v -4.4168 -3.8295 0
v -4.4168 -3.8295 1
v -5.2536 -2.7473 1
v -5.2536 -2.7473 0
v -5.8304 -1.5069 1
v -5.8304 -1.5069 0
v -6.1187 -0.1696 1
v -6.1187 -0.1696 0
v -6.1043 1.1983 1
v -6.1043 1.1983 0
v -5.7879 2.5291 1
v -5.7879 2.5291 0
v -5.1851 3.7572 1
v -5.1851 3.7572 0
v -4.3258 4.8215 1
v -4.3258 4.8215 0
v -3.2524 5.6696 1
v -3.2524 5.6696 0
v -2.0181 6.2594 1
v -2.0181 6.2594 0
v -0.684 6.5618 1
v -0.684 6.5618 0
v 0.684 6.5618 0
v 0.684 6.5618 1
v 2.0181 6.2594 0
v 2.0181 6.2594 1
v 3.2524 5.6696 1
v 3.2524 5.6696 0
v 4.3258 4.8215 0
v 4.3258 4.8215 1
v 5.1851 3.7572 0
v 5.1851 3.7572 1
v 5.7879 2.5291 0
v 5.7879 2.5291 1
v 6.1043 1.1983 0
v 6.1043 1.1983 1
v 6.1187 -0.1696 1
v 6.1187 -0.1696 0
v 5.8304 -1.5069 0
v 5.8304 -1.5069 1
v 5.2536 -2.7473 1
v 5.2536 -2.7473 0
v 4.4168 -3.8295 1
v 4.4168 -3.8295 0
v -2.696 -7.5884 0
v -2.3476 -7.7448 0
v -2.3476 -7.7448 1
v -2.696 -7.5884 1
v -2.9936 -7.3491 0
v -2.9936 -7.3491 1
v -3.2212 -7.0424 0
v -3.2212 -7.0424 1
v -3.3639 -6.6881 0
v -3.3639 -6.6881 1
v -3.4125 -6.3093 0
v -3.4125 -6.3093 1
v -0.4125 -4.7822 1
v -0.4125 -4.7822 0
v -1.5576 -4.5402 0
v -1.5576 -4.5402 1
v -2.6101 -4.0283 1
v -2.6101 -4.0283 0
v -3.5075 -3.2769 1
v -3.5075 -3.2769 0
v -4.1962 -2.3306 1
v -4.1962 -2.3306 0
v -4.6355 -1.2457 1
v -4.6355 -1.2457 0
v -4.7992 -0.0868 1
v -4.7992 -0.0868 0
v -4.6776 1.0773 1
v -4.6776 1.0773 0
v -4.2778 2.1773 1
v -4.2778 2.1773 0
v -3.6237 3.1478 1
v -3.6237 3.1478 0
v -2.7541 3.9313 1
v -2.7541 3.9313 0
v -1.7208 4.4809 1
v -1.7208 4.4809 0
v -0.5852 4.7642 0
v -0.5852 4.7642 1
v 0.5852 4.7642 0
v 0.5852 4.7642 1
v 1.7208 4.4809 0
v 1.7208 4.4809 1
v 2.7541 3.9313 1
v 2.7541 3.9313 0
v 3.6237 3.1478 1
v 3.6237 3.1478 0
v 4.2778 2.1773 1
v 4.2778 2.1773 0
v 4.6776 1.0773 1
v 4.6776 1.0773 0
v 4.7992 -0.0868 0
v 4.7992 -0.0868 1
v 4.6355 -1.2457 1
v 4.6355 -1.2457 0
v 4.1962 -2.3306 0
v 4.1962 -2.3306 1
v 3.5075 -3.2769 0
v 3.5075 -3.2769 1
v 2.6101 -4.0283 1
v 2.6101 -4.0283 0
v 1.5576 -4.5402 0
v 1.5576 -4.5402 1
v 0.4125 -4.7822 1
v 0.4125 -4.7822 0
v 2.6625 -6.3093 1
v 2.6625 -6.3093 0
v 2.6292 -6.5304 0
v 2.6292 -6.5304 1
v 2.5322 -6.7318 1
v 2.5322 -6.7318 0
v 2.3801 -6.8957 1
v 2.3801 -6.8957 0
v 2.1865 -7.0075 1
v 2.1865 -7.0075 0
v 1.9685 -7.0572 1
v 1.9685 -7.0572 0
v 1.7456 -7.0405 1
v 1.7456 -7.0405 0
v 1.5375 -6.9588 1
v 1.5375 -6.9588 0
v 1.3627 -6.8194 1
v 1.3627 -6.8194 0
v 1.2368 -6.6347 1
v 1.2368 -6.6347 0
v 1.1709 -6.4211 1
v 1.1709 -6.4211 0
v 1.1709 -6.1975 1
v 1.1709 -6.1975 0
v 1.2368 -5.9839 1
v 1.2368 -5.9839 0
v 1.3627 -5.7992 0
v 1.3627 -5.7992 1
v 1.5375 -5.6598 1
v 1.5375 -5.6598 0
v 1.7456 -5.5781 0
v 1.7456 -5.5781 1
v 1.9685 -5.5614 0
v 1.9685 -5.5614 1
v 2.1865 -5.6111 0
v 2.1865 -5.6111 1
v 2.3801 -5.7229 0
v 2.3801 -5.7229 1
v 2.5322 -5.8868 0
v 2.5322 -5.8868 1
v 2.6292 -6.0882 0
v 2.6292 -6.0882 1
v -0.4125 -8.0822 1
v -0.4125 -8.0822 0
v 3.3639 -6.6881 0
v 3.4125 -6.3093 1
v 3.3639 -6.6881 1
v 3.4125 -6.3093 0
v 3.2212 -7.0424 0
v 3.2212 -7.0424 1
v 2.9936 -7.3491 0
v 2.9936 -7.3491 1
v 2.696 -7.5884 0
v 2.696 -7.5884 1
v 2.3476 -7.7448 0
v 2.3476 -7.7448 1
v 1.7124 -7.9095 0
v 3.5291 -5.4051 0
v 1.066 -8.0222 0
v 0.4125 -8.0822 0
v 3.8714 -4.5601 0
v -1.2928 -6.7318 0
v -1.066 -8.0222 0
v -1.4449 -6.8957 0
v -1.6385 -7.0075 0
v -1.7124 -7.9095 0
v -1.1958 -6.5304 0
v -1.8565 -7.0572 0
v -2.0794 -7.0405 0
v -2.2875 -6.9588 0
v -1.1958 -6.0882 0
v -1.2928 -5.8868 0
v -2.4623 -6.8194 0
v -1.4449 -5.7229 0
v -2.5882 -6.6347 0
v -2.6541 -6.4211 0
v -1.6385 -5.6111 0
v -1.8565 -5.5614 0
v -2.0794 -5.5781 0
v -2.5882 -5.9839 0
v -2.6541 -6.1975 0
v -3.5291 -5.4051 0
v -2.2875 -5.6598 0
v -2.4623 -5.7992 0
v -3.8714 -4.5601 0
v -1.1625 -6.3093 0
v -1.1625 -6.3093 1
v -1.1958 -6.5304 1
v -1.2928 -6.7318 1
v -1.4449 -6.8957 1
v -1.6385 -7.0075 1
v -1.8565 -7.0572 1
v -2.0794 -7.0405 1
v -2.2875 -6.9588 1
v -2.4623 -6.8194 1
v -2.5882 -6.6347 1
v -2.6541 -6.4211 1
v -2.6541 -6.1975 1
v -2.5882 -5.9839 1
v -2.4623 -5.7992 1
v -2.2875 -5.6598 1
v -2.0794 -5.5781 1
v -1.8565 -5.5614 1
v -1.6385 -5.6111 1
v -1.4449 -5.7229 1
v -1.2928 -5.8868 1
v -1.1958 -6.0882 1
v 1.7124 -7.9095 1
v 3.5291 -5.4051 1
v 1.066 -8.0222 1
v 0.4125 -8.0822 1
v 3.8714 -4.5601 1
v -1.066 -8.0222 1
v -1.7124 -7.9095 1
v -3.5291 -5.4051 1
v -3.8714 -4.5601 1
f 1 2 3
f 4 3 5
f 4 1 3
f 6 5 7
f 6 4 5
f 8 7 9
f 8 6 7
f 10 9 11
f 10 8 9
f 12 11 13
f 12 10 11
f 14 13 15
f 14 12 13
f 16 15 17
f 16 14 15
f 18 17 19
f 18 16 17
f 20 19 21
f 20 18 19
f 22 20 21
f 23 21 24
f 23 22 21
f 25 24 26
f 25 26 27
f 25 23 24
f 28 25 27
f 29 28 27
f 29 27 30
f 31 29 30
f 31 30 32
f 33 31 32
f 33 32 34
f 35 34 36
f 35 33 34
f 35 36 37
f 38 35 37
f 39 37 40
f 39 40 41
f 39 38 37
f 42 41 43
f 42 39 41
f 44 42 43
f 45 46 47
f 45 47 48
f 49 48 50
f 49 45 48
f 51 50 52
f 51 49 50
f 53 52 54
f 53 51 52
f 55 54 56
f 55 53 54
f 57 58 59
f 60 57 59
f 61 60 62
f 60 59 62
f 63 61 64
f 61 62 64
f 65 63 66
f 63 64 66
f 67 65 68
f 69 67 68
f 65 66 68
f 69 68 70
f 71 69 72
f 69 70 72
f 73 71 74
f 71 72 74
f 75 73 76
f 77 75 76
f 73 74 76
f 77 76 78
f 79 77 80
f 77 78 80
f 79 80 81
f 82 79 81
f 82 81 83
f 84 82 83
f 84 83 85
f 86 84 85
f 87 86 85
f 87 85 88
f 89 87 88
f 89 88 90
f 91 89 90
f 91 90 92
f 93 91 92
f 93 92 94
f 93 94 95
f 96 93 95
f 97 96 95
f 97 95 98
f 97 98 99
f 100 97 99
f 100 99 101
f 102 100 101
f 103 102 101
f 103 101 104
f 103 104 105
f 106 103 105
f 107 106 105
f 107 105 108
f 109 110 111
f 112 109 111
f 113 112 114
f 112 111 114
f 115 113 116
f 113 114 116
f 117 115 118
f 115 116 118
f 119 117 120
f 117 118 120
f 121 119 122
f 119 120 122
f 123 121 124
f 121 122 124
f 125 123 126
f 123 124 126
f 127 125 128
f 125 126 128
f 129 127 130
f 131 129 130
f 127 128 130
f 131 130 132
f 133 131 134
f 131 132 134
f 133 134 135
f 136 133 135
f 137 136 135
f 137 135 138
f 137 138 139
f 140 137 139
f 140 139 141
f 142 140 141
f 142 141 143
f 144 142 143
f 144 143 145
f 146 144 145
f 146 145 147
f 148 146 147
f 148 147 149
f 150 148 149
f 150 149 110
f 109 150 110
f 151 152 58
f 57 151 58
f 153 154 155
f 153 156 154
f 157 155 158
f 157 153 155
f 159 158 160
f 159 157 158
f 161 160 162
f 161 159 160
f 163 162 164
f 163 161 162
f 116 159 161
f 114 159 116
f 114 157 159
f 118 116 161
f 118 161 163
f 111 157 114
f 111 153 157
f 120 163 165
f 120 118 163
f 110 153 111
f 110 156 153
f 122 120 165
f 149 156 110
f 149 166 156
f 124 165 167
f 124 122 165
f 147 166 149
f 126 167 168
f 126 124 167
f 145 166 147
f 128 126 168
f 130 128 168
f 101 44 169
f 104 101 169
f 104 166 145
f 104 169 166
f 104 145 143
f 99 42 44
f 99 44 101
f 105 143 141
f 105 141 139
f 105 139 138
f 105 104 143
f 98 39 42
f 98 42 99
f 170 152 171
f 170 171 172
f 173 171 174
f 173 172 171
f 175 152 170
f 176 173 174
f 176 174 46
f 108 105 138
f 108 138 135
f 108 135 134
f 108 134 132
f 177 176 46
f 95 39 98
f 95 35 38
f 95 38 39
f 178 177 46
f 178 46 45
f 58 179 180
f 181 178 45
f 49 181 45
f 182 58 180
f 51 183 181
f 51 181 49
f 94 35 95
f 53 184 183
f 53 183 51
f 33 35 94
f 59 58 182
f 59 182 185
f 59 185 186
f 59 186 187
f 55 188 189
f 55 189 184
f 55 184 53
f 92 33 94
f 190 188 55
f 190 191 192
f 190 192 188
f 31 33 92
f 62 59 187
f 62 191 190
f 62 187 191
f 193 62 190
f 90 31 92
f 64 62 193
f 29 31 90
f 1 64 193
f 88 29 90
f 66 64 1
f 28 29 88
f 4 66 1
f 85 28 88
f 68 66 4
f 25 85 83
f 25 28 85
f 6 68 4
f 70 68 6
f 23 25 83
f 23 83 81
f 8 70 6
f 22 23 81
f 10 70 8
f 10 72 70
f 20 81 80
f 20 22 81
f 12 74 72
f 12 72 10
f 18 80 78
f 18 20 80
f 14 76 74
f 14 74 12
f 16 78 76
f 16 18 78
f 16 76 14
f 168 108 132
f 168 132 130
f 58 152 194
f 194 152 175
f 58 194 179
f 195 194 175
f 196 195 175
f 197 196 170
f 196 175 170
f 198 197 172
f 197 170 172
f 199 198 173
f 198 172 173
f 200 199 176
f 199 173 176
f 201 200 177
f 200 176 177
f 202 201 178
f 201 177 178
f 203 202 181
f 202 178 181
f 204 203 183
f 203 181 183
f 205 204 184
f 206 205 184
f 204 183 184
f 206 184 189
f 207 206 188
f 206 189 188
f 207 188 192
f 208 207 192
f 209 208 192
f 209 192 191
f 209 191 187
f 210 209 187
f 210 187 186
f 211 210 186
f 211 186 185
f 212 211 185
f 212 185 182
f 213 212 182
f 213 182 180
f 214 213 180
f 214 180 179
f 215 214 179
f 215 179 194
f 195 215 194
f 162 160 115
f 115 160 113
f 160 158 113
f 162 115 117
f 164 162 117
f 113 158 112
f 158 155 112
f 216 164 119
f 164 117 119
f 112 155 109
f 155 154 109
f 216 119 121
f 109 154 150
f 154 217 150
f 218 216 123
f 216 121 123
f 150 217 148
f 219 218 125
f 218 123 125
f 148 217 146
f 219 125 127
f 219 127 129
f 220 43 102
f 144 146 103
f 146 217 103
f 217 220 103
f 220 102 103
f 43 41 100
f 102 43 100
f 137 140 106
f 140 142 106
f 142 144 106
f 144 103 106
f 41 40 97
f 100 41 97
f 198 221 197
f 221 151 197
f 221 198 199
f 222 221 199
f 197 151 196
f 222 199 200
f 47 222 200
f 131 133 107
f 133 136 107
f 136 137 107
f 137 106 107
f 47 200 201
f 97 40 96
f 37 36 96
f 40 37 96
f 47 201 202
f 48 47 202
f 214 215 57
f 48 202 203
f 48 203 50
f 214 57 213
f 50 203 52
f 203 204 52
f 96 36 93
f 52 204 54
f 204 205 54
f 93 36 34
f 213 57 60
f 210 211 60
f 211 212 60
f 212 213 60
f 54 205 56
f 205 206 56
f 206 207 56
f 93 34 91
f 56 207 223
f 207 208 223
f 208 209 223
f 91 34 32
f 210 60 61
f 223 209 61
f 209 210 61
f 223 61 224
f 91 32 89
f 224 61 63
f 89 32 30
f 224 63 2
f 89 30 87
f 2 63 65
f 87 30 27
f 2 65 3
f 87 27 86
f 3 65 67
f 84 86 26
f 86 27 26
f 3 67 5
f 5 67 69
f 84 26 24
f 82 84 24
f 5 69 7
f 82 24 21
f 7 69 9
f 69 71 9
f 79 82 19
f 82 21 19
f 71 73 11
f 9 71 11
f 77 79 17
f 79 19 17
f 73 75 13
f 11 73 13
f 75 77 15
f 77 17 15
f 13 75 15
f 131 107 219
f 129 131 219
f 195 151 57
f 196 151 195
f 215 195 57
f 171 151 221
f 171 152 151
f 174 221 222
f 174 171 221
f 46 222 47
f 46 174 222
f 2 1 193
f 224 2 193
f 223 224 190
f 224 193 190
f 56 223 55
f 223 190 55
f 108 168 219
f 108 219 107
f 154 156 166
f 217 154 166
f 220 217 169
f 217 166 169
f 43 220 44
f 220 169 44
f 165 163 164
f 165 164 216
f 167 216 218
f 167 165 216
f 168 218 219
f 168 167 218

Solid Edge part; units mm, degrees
sketch "Sketch1" plane through (0, 0, 0) normal (0, 0, 1) x (1, 0, 0)
  arc A0 (-2.3476, -7.7448) -> (-3.4125, -6.3093) centre (-1.9125, -6.3093) cw
  arc A1 (-4.4168, -3.8295) -> (-3.4125, -6.3093) centre (-6.976, -6.3093) cw
  arc A2 (-4.4168, -3.8295) -> (4.4168, -3.8295) centre (0, 0.45) cw
  arc A3 (4.4168, -3.8295) -> (3.4125, -6.3093) centre (6.976, -6.3093) ccw
  arc A4 (2.3476, -7.7448) -> (3.4125, -6.3093) centre (1.9125, -6.3093) ccw
  arc A5 (2.3476, -7.7448) -> (0.4125, -8.0822) centre (0, 0) cw
  line L0 (0.4125, -8.0822) -> (0.4125, -4.7822)
  arc A6 (-0.4125, -4.7822) -> (0.4125, -4.7822) centre (0, 0) cw
  line L1 (-0.4125, -8.0822) -> (-0.4125, -4.7822)
  arc A7 (-0.4125, -8.0822) -> (-2.3476, -7.7448) centre (0, 0) cw
  dimension "D1" = 4.8
  dimension "D2" = 6.15
  dimension "D3" = 1.8
  dimension "D4" = 0.4125
  dimension "D5" = 3.3
  dimension "D6" = 3
  dimension "D7" = 1.5
extrude "Protrusion1" add sketch "Sketch1" along normal blind 1
sketch "Sketch2" plane through (0, 0, 0) normal (0, 0, 1) x (1, 0, 0)
  circle A0 centre (-1.9125, -6.3093) radius 0.75
extrude "Cutout1" cut sketch "Sketch2" along normal through all
sketch "Sketch3" plane through (0, 0, 0) normal (0, 0, 1) x (1, 0, 0)
  circle A0 centre (1.9125, -6.3093) radius 0.75
extrude "Cutout2" cut sketch "Sketch3" along normal through all
properties material "Stahl"
